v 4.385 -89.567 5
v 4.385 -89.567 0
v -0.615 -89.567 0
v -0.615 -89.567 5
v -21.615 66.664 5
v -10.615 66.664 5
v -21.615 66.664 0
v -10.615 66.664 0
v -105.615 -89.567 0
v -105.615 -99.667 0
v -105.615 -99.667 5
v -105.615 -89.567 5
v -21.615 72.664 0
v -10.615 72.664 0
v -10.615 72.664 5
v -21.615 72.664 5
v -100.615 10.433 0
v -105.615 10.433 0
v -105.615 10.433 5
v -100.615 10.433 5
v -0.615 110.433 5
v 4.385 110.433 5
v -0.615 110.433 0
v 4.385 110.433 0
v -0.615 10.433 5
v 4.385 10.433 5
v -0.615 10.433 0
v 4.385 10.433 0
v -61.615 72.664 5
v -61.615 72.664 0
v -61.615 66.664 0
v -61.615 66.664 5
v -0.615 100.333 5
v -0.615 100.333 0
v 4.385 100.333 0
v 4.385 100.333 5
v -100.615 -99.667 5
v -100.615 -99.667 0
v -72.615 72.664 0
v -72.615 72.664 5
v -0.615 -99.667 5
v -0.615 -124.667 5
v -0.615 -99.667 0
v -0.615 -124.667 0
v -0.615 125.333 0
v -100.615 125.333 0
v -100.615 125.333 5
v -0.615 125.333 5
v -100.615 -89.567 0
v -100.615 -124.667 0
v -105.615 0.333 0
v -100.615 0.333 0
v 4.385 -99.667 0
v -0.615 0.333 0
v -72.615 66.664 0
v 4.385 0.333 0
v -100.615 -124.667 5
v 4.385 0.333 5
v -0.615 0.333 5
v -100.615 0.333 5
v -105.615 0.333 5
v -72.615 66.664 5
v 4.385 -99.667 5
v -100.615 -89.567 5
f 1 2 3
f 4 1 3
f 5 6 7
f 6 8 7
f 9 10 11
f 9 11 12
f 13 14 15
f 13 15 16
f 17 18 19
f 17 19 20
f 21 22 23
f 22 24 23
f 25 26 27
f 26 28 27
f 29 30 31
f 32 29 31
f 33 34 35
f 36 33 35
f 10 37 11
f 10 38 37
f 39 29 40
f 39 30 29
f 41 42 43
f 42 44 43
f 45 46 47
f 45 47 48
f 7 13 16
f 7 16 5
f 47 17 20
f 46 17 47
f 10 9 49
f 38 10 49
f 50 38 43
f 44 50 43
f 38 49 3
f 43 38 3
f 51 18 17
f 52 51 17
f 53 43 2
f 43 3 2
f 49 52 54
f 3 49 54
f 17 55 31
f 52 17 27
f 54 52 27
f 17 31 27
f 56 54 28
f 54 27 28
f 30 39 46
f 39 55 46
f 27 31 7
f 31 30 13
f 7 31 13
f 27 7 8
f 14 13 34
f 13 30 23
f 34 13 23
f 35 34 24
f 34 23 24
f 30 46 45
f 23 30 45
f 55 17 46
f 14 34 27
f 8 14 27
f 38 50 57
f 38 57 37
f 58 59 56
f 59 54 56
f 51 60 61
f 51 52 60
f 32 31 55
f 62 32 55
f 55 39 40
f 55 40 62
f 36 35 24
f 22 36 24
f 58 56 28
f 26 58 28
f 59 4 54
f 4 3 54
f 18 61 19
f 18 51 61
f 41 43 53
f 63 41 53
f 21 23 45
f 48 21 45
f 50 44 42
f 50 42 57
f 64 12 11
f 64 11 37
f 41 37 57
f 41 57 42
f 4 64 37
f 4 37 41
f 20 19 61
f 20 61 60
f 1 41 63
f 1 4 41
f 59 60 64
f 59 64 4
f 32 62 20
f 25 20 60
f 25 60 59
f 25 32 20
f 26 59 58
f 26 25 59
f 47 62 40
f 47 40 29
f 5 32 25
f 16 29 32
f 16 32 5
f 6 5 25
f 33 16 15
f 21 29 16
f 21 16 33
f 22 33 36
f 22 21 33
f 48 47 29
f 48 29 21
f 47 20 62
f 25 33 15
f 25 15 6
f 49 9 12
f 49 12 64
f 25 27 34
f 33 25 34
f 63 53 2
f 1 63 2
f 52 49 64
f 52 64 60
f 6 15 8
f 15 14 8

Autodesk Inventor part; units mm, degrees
ref_plane "YZ Plane" through (0, 0, 0) normal (1, 0, 0) x (0, 1, 0)
ref_plane "XZ Plane" through (0, 0, 0) normal (0, 1, 0) x (-1, 0, 0)
ref_plane "XY Plane" through (0, 0, 0) normal (0, 0, 1) x (1, 0, 0)
sketch "Sketch1" plane through (0, 0, 0) normal (0, 0, 1) x (1, 0, 0)
  line L0 (-100.6151, -124.6674) -> (-100.6151, 125.3326)
  line L1 (-41.6151, -124.6674) -> (-41.6151, 125.3326) construction
  line L2 (-0.6151, -124.6674) -> (-0.6151, 73.3335)
  line L3 (-0.6151, -124.6674) -> (-100.6151, -124.6674)
  line L4 (4.3849, 110.4326) -> (-0.6151, 110.4326)
  line L5 (4.3849, 100.3326) -> (4.3849, 110.4326)
  line L6 (-0.6151, 100.3326) -> (4.3849, 100.3326)
  line L7 (4.3849, -89.5674) -> (-0.6151, -89.5674)
  line L8 (4.3849, -99.6674) -> (4.3849, -89.5674)
  line L9 (-0.6151, -99.6674) -> (4.3849, -99.6674)
  line L10 (-100.6151, 10.4326) -> (-100.6151, 0.3326)
  line L11 (-100.6151, 0.3326) -> (-0.6151, 0.3326) construction
  line L12 (-0.6151, 0.3326) -> (4.3849, 0.3326)
  line L13 (-0.6151, 0.3326) -> (4.3849, 0.3326)
  line L14 (4.3849, 0.3326) -> (4.3849, 10.4326)
  line L15 (4.3849, 0.3326) -> (4.3849, 10.4326)
  line L16 (4.3849, 10.4326) -> (-0.6151, 10.4326)
  line L17 (4.3849, 10.4326) -> (-0.6151, 10.4326)
  line L18 (-0.6151, 73.3335) -> (-0.6151, 125.3326)
  line L19 (-0.6151, 125.3326) -> (-0.6151, 75.3326)
  line L20 (-0.6151, 75.3326) -> (-100.6151, 75.3326) construction
  line L21 (-105.6151, -99.6674) -> (-105.6151, -89.5674)
  line L22 (-105.6151, -89.5674) -> (-100.6151, -89.5674)
  line L23 (-100.6151, -99.6674) -> (-105.6151, -99.6674)
  line L24 (-105.6151, 10.4326) -> (-100.6151, 10.4326)
  line L25 (-105.6151, 0.3326) -> (-105.6151, 10.4326)
  line L26 (-100.6151, 0.3326) -> (-105.6151, 0.3326)
  line L27 (-100.6151, 125.3326) -> (-0.6151, 125.3326)
  line L28 (-0.6151, 125.3326) -> (-10.6151, 125.3326)
  line L29 (-0.6151, 76.5945) -> (-0.6151, 125.3326)
  line L30 (-100.6151, 125.3326) -> (-90.6151, 125.3326)
  line L31 (-100.6151, 76.6641) -> (-100.6151, 125.3326)
  line L32 (-82.6151, 75.3326) -> (17.3849, 75.3326) construction
  line L33 (-10.6151, 72.6641) -> (-10.6151, 66.6641)
  line L34 (-21.6151, 72.6641) -> (-21.6151, 66.6641)
  line L35 (-61.6151, 72.6641) -> (-61.6151, 66.6641)
  line L36 (-72.6151, 72.6641) -> (-72.6151, 66.6641)
  line L37 (-21.6151, 72.6641) -> (-61.6151, 72.6641) construction
  line L38 (-21.6151, 66.6641) -> (-61.6151, 66.6641) construction
  line L39 (-10.6151, 66.6641) -> (-21.6151, 66.6641)
  line L40 (-10.6151, 72.6641) -> (-21.6151, 72.6641)
  line L41 (-61.6151, 72.6641) -> (-72.6151, 72.6641)
  line L42 (-61.6151, 66.6641) -> (-72.6151, 66.6641)
  line L43 (-72.6151, 66.6641) -> (-100.6151, 66.6641) construction
  line L44 (-72.6151, 72.6641) -> (-100.6151, 72.6641) construction
  point P0 (0, 0)
  point P1 (4.3849, 105.3826)
  point P2 (-10.6151, 69.6641)
  point P3 (4.3849, -94.6174)
  point P4 (4.3849, 5.3826)
  point P5 (4.3849, 5.3826)
  point P6 (-105.6151, -94.6174)
  point P7 (-105.6151, 5.3826)
  dimension "d1" = 11
  dimension "d4" = 40
  dimension "d6" = 5
  dimension "d7" = 10
  dimension "d8" = 100
extrude "Extrusion1" add sketch "Sketch1" along normal blind 5
properties part number "Lifting Sections back"
